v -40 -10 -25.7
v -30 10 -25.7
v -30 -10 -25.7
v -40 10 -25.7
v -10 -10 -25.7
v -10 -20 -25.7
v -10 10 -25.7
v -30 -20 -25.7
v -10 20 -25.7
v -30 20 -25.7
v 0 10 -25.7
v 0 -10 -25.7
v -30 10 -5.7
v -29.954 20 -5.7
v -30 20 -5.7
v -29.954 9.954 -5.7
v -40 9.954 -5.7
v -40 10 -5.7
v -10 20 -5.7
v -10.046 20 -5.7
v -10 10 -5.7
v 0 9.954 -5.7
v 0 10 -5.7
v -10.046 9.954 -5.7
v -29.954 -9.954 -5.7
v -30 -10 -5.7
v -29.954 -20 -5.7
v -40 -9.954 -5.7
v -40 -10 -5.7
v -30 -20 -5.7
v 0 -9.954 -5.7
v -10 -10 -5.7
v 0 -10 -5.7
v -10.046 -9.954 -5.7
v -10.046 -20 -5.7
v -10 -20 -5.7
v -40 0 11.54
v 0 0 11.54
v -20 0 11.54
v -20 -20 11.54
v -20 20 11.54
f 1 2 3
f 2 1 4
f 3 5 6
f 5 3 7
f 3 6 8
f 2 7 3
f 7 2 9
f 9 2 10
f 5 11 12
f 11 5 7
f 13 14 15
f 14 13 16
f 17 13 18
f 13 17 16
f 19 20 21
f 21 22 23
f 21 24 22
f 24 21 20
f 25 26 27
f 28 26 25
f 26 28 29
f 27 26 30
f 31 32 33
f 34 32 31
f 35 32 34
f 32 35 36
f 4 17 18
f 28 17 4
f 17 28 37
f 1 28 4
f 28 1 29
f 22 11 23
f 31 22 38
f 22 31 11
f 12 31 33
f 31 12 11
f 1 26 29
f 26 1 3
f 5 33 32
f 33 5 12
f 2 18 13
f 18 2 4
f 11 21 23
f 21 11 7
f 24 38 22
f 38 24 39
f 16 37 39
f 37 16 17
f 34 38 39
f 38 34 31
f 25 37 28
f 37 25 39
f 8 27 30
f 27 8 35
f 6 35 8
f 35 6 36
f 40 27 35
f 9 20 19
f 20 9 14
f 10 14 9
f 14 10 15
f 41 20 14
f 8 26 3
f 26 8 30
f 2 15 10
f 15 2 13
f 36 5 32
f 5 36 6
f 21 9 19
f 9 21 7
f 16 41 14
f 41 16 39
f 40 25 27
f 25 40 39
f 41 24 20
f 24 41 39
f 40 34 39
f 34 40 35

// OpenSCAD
union(){
translate([0,-10,-25.7])
rotate([0,-90,0])
cube([20,20,40]);

translate([0,0,0])
rotate([0,-90,0])
cylinder(r=11.54, h=40, $fn=3);
}

translate([-20,20,0])
rotate([0,0,90])
union(){
translate([0,-10,-25.7])
rotate([0,-90,0])
cube([20,20,40]);

translate([0,0,0])
rotate([0,-90,0])
cylinder(r=11.54, h=40, $fn=3);
}
